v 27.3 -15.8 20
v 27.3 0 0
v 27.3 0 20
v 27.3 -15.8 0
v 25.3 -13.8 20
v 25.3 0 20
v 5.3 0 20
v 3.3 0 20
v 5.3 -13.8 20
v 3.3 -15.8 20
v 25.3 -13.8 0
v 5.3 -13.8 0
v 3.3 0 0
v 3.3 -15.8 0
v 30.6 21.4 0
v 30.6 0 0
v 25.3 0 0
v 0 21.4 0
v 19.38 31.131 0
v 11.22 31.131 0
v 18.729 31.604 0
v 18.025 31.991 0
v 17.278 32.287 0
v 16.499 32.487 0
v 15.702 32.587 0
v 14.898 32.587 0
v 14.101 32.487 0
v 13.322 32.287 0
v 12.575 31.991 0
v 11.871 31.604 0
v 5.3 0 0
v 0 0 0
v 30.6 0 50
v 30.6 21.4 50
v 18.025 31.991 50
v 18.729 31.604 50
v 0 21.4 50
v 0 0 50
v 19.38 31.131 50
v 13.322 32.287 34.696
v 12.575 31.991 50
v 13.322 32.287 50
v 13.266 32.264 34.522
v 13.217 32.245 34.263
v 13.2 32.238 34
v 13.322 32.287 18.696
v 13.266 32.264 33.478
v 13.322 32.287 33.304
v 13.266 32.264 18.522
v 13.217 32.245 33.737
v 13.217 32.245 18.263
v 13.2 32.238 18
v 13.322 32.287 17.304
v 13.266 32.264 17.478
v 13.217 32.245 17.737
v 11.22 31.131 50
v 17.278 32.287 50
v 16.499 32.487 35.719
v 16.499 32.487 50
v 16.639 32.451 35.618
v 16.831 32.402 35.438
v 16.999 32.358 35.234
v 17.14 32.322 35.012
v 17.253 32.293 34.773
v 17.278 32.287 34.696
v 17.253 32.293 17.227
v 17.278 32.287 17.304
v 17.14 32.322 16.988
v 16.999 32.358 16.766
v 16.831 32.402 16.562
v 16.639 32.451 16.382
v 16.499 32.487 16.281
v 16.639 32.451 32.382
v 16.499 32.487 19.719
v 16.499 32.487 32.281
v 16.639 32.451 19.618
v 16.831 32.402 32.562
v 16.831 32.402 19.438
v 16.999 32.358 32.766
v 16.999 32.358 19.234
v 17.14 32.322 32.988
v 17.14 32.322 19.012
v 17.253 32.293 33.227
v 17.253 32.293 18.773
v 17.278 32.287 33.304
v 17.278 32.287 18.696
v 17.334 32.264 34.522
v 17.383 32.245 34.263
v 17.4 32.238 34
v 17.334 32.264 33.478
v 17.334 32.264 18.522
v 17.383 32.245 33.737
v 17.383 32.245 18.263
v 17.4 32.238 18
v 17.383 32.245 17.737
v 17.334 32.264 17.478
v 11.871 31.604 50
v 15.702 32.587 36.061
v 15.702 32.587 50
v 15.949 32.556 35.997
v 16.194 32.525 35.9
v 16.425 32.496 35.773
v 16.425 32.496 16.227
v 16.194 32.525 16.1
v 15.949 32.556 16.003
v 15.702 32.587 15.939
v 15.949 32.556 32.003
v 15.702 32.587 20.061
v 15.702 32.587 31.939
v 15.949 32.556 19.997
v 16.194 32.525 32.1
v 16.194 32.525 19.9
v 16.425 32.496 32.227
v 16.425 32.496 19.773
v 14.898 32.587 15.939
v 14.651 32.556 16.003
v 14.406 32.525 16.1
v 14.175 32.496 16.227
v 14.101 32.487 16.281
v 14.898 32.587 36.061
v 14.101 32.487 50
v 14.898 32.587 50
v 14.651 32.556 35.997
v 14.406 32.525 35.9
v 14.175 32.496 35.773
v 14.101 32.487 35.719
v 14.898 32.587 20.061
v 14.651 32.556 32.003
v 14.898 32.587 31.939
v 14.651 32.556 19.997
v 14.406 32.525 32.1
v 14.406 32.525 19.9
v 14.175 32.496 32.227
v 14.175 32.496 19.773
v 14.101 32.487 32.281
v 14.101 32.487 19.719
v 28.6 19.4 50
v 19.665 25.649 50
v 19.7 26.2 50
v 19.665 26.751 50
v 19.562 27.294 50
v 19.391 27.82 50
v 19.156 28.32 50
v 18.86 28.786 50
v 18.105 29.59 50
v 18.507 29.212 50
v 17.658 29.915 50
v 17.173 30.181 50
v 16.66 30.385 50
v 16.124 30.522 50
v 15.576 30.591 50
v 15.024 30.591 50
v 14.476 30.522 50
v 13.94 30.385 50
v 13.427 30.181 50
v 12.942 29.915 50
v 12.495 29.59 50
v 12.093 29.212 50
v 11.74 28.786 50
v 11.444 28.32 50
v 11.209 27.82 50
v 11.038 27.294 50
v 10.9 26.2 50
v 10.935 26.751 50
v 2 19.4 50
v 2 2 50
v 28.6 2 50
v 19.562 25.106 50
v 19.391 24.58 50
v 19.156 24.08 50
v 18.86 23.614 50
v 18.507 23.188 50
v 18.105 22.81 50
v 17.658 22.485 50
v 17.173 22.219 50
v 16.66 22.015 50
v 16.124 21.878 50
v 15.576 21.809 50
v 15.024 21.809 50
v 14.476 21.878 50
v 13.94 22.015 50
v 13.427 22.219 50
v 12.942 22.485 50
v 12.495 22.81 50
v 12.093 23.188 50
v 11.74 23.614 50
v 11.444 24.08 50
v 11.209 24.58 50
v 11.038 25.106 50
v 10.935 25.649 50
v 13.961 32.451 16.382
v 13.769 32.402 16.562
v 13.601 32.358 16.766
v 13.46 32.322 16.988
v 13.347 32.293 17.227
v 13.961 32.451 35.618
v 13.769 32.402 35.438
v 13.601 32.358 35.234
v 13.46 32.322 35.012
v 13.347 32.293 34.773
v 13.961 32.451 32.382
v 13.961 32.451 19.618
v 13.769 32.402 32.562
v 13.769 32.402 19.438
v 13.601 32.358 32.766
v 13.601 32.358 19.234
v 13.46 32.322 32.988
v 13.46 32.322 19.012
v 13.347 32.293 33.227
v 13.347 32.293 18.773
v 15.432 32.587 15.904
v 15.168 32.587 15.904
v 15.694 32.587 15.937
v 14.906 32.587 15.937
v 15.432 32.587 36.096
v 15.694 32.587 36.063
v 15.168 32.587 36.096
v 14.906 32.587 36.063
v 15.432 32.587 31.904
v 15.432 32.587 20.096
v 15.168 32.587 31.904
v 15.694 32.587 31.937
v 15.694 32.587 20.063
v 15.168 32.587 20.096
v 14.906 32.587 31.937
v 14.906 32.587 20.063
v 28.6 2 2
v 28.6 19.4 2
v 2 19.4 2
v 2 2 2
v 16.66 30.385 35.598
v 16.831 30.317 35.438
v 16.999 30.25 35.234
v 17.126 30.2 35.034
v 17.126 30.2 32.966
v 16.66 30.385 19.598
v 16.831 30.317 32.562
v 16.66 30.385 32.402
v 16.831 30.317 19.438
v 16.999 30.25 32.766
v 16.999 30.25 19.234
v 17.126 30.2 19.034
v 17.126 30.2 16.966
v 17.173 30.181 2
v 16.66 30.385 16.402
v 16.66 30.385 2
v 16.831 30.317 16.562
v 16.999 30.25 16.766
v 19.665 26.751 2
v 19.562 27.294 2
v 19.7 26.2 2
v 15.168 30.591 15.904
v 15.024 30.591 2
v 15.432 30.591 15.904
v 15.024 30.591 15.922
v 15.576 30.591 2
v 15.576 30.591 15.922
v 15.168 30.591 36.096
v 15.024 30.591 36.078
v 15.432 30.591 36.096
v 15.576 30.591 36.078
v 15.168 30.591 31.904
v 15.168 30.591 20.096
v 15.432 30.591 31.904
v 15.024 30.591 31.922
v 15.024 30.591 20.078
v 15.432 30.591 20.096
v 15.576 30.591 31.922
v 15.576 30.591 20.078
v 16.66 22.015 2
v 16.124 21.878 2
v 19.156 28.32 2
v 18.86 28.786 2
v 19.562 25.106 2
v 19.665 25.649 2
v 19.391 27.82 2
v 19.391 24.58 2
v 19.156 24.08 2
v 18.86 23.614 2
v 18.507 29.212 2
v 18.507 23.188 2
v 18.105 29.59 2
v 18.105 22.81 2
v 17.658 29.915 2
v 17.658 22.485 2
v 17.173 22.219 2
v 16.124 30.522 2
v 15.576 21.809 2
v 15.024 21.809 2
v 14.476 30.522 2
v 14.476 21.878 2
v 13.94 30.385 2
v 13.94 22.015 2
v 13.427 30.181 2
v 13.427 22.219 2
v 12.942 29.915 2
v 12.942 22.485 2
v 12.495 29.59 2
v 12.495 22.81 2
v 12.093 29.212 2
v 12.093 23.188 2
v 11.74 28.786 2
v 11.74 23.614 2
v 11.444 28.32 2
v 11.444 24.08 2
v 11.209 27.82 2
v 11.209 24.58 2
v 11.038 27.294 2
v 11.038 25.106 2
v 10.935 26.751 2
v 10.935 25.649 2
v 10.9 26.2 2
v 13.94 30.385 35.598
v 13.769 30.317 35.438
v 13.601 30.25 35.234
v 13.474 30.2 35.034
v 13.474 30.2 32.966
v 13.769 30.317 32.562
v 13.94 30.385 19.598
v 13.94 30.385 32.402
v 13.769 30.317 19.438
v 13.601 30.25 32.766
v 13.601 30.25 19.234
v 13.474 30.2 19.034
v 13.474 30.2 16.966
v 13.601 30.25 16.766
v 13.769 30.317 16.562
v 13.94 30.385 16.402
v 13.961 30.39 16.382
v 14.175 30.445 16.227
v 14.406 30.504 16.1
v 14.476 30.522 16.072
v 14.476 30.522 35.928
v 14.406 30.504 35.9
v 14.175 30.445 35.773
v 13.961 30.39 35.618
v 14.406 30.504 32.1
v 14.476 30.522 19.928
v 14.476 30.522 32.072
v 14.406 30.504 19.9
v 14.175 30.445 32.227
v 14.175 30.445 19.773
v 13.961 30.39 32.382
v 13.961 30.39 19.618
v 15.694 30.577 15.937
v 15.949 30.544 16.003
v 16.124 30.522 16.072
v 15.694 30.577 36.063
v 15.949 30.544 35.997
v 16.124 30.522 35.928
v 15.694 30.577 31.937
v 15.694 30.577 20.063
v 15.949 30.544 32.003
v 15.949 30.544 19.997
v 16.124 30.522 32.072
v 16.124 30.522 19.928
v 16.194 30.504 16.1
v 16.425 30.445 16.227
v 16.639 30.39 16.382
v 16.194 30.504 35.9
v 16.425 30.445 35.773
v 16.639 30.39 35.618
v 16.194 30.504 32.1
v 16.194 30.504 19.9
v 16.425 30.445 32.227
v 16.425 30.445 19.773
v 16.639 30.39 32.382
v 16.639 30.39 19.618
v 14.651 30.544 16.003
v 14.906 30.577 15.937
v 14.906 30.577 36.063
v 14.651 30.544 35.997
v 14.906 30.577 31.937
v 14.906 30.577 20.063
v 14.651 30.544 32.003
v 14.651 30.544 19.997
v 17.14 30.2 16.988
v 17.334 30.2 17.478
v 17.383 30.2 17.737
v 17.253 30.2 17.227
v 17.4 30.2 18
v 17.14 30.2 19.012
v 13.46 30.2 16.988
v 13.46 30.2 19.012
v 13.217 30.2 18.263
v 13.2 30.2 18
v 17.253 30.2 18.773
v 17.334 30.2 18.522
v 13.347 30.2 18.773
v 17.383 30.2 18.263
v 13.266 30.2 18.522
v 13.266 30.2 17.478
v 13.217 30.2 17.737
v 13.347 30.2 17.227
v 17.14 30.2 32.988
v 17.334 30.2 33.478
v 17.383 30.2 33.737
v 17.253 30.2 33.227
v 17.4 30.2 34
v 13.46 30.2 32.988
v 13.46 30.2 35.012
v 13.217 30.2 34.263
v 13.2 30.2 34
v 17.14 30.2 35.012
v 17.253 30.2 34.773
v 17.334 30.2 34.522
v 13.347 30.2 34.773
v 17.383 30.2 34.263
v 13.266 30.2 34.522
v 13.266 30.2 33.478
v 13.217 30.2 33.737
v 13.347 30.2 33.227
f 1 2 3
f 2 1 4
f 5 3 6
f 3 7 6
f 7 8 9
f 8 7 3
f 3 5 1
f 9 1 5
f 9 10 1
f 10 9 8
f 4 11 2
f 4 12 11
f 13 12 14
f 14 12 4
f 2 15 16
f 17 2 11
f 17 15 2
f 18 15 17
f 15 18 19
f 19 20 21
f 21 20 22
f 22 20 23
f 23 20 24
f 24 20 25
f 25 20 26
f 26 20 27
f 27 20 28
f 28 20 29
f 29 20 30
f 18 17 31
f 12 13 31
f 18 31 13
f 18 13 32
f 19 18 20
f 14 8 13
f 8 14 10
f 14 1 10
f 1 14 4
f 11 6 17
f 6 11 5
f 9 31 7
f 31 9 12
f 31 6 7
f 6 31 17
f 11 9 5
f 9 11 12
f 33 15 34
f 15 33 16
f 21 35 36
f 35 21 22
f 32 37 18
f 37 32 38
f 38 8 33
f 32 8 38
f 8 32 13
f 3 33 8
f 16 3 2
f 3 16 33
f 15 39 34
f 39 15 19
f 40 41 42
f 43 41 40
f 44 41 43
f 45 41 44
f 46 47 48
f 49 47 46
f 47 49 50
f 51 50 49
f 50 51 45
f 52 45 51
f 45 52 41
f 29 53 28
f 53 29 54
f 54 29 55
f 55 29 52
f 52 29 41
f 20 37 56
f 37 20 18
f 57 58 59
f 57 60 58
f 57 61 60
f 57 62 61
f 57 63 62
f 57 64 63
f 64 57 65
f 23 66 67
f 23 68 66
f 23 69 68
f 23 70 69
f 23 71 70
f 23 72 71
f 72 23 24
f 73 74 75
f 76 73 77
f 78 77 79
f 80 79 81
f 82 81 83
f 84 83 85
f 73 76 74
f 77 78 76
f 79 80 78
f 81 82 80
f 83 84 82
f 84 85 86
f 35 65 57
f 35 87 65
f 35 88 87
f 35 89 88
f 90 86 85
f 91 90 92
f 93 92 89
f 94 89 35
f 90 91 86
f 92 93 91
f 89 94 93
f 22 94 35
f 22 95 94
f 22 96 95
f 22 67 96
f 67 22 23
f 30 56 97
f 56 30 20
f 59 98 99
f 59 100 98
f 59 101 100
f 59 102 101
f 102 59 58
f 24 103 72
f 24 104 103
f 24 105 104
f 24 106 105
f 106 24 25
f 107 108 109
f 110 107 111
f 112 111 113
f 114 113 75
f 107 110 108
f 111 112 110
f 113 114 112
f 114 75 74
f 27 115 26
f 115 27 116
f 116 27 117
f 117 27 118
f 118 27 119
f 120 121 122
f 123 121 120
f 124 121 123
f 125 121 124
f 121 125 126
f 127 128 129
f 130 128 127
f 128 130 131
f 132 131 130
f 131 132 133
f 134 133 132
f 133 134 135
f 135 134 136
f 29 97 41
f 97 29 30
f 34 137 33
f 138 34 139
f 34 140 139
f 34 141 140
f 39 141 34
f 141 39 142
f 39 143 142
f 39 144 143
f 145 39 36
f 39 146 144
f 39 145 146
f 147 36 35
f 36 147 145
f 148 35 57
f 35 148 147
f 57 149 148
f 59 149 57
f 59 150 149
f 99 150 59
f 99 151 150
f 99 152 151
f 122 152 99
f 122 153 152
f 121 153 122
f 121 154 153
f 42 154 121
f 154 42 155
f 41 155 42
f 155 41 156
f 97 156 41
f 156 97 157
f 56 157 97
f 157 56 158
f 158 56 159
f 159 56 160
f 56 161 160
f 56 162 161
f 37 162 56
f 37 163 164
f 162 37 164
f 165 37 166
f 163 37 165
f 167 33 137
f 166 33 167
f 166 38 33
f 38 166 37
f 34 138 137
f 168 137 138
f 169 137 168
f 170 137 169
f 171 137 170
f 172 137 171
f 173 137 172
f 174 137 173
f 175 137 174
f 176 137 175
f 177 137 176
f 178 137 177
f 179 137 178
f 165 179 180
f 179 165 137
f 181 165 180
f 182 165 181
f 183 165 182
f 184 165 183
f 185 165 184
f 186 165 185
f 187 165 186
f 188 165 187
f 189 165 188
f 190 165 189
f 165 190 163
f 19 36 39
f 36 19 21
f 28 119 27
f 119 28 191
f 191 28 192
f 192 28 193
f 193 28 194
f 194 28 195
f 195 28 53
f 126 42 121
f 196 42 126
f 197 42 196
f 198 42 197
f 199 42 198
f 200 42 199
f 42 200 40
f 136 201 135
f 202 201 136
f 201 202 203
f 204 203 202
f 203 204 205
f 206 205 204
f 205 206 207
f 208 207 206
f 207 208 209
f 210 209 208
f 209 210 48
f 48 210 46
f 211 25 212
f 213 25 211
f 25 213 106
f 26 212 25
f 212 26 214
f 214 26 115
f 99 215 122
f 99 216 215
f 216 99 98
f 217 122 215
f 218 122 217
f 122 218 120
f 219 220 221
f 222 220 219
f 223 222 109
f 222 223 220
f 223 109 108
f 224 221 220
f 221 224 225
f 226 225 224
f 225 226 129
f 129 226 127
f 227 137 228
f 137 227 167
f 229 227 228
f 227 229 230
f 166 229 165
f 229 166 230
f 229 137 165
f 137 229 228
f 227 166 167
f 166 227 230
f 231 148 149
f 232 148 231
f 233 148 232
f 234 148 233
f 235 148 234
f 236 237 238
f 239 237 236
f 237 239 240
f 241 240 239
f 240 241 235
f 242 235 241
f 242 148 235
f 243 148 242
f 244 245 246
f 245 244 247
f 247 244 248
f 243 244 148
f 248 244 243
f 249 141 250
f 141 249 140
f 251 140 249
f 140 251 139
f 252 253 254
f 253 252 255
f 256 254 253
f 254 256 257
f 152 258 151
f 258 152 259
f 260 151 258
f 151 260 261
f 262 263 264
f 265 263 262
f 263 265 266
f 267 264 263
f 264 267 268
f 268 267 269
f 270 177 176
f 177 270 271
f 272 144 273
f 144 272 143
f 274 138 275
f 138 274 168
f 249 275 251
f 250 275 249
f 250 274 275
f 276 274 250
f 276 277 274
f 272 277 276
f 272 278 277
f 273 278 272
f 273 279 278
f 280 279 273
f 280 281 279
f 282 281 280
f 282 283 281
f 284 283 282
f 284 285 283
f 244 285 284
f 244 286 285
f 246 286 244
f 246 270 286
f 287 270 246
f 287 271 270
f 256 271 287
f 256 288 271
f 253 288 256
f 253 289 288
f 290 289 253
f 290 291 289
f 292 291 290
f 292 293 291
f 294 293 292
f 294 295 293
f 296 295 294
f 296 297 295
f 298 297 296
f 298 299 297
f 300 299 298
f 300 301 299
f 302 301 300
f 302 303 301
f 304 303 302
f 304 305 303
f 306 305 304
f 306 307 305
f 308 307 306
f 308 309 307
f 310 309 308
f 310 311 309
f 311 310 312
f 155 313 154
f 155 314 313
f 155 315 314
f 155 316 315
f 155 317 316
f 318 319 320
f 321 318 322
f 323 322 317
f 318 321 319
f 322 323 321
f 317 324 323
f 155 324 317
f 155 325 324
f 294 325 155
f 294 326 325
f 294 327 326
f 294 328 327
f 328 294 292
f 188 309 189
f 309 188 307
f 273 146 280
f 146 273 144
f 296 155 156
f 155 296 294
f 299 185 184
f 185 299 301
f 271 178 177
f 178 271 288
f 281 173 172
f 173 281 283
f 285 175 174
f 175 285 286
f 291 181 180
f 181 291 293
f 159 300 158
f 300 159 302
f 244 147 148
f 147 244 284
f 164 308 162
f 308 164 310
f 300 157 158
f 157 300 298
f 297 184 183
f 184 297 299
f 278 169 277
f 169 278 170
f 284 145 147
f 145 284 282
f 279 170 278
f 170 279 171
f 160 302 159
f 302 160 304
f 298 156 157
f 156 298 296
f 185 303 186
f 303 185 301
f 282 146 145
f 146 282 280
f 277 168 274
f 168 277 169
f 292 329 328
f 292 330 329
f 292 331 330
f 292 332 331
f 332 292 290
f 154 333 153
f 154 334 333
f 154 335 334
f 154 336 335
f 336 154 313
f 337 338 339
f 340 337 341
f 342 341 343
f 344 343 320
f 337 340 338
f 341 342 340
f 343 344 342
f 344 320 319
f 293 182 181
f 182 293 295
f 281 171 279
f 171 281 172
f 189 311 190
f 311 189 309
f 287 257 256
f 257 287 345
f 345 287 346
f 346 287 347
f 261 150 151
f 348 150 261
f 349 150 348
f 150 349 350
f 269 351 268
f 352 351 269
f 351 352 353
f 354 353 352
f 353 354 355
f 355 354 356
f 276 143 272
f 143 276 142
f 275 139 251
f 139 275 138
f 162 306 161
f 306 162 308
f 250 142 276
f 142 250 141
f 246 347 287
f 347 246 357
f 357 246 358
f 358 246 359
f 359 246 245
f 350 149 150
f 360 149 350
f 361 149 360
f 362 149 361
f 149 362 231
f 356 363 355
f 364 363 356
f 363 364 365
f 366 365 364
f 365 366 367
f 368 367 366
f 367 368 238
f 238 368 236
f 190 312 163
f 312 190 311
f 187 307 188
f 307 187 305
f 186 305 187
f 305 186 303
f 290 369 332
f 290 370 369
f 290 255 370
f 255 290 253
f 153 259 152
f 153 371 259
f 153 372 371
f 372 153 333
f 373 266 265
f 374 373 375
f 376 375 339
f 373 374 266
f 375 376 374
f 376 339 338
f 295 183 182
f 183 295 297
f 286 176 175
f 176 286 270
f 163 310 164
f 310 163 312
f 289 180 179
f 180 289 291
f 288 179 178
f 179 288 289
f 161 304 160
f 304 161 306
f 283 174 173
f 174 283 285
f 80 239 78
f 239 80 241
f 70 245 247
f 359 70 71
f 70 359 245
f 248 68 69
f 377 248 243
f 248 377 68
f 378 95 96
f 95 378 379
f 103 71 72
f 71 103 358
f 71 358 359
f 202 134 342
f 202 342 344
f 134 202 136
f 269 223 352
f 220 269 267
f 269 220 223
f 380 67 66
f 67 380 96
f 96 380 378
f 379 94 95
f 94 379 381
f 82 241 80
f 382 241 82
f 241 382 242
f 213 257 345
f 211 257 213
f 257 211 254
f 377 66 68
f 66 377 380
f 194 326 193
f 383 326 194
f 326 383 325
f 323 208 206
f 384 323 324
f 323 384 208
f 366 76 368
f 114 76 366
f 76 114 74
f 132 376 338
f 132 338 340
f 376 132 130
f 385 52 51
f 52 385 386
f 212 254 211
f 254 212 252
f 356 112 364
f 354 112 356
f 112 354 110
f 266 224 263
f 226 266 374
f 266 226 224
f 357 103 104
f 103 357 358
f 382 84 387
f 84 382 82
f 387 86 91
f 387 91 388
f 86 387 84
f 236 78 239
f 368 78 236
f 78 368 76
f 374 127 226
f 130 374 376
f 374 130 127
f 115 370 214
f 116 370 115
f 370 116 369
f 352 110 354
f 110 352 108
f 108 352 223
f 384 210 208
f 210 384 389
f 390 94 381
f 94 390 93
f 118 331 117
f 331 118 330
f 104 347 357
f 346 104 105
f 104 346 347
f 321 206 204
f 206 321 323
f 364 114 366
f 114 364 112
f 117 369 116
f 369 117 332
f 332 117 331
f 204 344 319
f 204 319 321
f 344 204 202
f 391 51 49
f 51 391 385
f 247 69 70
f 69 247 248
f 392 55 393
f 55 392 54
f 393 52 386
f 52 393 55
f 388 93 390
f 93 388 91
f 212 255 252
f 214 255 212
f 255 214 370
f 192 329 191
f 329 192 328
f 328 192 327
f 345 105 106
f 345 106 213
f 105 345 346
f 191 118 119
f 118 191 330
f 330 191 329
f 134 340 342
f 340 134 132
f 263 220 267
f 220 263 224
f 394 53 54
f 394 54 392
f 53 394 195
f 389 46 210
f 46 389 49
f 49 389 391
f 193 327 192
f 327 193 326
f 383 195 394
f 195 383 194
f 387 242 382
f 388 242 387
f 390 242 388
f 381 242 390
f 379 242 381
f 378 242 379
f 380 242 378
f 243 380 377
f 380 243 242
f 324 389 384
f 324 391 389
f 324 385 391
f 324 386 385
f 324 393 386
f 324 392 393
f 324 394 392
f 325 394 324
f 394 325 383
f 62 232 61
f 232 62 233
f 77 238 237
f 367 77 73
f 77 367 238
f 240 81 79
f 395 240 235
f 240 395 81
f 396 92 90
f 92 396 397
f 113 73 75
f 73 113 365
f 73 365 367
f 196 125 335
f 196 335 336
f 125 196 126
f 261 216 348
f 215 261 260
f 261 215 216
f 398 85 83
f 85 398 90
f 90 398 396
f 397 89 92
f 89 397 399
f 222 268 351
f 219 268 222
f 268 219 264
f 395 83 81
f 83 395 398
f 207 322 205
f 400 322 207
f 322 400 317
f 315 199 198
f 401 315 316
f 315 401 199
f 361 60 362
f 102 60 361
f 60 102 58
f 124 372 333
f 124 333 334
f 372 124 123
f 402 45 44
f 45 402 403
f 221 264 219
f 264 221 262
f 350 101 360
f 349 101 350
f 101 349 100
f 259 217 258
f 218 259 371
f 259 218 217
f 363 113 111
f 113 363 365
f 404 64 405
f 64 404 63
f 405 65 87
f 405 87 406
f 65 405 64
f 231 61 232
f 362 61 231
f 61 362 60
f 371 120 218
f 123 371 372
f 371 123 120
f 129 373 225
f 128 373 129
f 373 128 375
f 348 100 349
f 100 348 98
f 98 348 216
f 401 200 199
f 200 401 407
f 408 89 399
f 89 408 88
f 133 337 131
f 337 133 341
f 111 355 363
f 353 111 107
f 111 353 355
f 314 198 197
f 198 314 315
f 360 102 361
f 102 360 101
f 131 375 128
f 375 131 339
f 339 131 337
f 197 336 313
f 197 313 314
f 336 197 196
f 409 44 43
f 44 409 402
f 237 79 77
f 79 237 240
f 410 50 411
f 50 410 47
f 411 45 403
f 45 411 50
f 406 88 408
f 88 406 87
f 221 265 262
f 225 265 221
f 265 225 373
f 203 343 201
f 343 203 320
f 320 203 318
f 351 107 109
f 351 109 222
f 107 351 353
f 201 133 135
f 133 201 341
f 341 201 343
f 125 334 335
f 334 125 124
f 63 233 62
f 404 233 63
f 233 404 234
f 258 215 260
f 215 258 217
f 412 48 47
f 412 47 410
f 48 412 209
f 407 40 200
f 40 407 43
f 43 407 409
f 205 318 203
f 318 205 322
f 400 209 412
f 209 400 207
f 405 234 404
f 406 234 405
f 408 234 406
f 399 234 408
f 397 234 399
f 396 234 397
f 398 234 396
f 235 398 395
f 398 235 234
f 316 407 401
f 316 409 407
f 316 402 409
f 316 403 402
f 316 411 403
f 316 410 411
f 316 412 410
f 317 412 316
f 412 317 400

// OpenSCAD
///////////////
// Variables //
///////////////

/* [Option] */

// 0: without switch block, 1: With switch block
switch = 1;

/* [General] */

// Battery case height
b_height = 48;

// Battery case length
b_length = 26.6;

// Battery case width
b_width = 17.4;

// Latern stick diameter
stick_diameter = 8.8;

// Screw hole diameter
screw_hole_diameter = 4.2;

/* [Switch] */

// Switch width
switch_x = 20;

// Switch length
switch_y = 13.8;

// Switch height
switch_z = 20;


/* [Misc] */

// Resolution
$fn=50;

// Avoid artifacts
clearance = 0.01;

// Wall width
wall_width = 2;


///////////
// Build //
///////////

if (switch) {
    translate([
        (b_length+2*wall_width)/2-switch_x/2-wall_width,
        -switch_y-wall_width,
        0
    ]) {
        difference() {
            cube([
                switch_x+2*wall_width,
                switch_y+2*wall_width,
                switch_z
            ]);
            translate([wall_width,wall_width,-clearance]) {
                cube([
                    switch_x,
                    switch_y,
                    switch_z+2*clearance
                ]);
            }
        }
    };
}

difference() {

    hull() {

        // Outer cube
        cube([
            b_length+2*wall_width,
            b_width+2*wall_width,
            b_height+wall_width
        ]);
        
        // Stick case
        translate([
            (b_length+2*wall_width)/2,
            (b_width)+stick_diameter,
            0
        ]) {
            cylinder(
                d=stick_diameter+2*wall_width,
                h=b_height+wall_width
            );
        }
    }

    // Battery hole
    translate([wall_width,wall_width,wall_width]){
        cube([b_length, b_width, b_height+clearance]);
    }
    
    // Stick hole
    translate([
        (b_length+2*wall_width)/2,
        (b_width)+stick_diameter,
        wall_width
    ]) {
        cylinder(
            d=stick_diameter,
            h=b_height+wall_width+clearance
        );
    }
    
    translate([
        (b_length+2*wall_width)/2,
        b_width+stick_diameter+2*wall_width,
        b_height/3+wall_width
    ]) {
        rotate(270, [1,0,0]) {
            cylinder(
                d=screw_hole_diameter,
                h=2*wall_width+clearance
            );
        }
    }
    
    translate([
        (b_length+2*wall_width)/2,
        b_width+stick_diameter+2*wall_width,
        b_height/3*2+wall_width
    ]) {
        rotate(270, [1,0,0]) {
            cylinder(
                d=screw_hole_diameter,
                h=2*wall_width+clearance
            );
        }
    }
}
